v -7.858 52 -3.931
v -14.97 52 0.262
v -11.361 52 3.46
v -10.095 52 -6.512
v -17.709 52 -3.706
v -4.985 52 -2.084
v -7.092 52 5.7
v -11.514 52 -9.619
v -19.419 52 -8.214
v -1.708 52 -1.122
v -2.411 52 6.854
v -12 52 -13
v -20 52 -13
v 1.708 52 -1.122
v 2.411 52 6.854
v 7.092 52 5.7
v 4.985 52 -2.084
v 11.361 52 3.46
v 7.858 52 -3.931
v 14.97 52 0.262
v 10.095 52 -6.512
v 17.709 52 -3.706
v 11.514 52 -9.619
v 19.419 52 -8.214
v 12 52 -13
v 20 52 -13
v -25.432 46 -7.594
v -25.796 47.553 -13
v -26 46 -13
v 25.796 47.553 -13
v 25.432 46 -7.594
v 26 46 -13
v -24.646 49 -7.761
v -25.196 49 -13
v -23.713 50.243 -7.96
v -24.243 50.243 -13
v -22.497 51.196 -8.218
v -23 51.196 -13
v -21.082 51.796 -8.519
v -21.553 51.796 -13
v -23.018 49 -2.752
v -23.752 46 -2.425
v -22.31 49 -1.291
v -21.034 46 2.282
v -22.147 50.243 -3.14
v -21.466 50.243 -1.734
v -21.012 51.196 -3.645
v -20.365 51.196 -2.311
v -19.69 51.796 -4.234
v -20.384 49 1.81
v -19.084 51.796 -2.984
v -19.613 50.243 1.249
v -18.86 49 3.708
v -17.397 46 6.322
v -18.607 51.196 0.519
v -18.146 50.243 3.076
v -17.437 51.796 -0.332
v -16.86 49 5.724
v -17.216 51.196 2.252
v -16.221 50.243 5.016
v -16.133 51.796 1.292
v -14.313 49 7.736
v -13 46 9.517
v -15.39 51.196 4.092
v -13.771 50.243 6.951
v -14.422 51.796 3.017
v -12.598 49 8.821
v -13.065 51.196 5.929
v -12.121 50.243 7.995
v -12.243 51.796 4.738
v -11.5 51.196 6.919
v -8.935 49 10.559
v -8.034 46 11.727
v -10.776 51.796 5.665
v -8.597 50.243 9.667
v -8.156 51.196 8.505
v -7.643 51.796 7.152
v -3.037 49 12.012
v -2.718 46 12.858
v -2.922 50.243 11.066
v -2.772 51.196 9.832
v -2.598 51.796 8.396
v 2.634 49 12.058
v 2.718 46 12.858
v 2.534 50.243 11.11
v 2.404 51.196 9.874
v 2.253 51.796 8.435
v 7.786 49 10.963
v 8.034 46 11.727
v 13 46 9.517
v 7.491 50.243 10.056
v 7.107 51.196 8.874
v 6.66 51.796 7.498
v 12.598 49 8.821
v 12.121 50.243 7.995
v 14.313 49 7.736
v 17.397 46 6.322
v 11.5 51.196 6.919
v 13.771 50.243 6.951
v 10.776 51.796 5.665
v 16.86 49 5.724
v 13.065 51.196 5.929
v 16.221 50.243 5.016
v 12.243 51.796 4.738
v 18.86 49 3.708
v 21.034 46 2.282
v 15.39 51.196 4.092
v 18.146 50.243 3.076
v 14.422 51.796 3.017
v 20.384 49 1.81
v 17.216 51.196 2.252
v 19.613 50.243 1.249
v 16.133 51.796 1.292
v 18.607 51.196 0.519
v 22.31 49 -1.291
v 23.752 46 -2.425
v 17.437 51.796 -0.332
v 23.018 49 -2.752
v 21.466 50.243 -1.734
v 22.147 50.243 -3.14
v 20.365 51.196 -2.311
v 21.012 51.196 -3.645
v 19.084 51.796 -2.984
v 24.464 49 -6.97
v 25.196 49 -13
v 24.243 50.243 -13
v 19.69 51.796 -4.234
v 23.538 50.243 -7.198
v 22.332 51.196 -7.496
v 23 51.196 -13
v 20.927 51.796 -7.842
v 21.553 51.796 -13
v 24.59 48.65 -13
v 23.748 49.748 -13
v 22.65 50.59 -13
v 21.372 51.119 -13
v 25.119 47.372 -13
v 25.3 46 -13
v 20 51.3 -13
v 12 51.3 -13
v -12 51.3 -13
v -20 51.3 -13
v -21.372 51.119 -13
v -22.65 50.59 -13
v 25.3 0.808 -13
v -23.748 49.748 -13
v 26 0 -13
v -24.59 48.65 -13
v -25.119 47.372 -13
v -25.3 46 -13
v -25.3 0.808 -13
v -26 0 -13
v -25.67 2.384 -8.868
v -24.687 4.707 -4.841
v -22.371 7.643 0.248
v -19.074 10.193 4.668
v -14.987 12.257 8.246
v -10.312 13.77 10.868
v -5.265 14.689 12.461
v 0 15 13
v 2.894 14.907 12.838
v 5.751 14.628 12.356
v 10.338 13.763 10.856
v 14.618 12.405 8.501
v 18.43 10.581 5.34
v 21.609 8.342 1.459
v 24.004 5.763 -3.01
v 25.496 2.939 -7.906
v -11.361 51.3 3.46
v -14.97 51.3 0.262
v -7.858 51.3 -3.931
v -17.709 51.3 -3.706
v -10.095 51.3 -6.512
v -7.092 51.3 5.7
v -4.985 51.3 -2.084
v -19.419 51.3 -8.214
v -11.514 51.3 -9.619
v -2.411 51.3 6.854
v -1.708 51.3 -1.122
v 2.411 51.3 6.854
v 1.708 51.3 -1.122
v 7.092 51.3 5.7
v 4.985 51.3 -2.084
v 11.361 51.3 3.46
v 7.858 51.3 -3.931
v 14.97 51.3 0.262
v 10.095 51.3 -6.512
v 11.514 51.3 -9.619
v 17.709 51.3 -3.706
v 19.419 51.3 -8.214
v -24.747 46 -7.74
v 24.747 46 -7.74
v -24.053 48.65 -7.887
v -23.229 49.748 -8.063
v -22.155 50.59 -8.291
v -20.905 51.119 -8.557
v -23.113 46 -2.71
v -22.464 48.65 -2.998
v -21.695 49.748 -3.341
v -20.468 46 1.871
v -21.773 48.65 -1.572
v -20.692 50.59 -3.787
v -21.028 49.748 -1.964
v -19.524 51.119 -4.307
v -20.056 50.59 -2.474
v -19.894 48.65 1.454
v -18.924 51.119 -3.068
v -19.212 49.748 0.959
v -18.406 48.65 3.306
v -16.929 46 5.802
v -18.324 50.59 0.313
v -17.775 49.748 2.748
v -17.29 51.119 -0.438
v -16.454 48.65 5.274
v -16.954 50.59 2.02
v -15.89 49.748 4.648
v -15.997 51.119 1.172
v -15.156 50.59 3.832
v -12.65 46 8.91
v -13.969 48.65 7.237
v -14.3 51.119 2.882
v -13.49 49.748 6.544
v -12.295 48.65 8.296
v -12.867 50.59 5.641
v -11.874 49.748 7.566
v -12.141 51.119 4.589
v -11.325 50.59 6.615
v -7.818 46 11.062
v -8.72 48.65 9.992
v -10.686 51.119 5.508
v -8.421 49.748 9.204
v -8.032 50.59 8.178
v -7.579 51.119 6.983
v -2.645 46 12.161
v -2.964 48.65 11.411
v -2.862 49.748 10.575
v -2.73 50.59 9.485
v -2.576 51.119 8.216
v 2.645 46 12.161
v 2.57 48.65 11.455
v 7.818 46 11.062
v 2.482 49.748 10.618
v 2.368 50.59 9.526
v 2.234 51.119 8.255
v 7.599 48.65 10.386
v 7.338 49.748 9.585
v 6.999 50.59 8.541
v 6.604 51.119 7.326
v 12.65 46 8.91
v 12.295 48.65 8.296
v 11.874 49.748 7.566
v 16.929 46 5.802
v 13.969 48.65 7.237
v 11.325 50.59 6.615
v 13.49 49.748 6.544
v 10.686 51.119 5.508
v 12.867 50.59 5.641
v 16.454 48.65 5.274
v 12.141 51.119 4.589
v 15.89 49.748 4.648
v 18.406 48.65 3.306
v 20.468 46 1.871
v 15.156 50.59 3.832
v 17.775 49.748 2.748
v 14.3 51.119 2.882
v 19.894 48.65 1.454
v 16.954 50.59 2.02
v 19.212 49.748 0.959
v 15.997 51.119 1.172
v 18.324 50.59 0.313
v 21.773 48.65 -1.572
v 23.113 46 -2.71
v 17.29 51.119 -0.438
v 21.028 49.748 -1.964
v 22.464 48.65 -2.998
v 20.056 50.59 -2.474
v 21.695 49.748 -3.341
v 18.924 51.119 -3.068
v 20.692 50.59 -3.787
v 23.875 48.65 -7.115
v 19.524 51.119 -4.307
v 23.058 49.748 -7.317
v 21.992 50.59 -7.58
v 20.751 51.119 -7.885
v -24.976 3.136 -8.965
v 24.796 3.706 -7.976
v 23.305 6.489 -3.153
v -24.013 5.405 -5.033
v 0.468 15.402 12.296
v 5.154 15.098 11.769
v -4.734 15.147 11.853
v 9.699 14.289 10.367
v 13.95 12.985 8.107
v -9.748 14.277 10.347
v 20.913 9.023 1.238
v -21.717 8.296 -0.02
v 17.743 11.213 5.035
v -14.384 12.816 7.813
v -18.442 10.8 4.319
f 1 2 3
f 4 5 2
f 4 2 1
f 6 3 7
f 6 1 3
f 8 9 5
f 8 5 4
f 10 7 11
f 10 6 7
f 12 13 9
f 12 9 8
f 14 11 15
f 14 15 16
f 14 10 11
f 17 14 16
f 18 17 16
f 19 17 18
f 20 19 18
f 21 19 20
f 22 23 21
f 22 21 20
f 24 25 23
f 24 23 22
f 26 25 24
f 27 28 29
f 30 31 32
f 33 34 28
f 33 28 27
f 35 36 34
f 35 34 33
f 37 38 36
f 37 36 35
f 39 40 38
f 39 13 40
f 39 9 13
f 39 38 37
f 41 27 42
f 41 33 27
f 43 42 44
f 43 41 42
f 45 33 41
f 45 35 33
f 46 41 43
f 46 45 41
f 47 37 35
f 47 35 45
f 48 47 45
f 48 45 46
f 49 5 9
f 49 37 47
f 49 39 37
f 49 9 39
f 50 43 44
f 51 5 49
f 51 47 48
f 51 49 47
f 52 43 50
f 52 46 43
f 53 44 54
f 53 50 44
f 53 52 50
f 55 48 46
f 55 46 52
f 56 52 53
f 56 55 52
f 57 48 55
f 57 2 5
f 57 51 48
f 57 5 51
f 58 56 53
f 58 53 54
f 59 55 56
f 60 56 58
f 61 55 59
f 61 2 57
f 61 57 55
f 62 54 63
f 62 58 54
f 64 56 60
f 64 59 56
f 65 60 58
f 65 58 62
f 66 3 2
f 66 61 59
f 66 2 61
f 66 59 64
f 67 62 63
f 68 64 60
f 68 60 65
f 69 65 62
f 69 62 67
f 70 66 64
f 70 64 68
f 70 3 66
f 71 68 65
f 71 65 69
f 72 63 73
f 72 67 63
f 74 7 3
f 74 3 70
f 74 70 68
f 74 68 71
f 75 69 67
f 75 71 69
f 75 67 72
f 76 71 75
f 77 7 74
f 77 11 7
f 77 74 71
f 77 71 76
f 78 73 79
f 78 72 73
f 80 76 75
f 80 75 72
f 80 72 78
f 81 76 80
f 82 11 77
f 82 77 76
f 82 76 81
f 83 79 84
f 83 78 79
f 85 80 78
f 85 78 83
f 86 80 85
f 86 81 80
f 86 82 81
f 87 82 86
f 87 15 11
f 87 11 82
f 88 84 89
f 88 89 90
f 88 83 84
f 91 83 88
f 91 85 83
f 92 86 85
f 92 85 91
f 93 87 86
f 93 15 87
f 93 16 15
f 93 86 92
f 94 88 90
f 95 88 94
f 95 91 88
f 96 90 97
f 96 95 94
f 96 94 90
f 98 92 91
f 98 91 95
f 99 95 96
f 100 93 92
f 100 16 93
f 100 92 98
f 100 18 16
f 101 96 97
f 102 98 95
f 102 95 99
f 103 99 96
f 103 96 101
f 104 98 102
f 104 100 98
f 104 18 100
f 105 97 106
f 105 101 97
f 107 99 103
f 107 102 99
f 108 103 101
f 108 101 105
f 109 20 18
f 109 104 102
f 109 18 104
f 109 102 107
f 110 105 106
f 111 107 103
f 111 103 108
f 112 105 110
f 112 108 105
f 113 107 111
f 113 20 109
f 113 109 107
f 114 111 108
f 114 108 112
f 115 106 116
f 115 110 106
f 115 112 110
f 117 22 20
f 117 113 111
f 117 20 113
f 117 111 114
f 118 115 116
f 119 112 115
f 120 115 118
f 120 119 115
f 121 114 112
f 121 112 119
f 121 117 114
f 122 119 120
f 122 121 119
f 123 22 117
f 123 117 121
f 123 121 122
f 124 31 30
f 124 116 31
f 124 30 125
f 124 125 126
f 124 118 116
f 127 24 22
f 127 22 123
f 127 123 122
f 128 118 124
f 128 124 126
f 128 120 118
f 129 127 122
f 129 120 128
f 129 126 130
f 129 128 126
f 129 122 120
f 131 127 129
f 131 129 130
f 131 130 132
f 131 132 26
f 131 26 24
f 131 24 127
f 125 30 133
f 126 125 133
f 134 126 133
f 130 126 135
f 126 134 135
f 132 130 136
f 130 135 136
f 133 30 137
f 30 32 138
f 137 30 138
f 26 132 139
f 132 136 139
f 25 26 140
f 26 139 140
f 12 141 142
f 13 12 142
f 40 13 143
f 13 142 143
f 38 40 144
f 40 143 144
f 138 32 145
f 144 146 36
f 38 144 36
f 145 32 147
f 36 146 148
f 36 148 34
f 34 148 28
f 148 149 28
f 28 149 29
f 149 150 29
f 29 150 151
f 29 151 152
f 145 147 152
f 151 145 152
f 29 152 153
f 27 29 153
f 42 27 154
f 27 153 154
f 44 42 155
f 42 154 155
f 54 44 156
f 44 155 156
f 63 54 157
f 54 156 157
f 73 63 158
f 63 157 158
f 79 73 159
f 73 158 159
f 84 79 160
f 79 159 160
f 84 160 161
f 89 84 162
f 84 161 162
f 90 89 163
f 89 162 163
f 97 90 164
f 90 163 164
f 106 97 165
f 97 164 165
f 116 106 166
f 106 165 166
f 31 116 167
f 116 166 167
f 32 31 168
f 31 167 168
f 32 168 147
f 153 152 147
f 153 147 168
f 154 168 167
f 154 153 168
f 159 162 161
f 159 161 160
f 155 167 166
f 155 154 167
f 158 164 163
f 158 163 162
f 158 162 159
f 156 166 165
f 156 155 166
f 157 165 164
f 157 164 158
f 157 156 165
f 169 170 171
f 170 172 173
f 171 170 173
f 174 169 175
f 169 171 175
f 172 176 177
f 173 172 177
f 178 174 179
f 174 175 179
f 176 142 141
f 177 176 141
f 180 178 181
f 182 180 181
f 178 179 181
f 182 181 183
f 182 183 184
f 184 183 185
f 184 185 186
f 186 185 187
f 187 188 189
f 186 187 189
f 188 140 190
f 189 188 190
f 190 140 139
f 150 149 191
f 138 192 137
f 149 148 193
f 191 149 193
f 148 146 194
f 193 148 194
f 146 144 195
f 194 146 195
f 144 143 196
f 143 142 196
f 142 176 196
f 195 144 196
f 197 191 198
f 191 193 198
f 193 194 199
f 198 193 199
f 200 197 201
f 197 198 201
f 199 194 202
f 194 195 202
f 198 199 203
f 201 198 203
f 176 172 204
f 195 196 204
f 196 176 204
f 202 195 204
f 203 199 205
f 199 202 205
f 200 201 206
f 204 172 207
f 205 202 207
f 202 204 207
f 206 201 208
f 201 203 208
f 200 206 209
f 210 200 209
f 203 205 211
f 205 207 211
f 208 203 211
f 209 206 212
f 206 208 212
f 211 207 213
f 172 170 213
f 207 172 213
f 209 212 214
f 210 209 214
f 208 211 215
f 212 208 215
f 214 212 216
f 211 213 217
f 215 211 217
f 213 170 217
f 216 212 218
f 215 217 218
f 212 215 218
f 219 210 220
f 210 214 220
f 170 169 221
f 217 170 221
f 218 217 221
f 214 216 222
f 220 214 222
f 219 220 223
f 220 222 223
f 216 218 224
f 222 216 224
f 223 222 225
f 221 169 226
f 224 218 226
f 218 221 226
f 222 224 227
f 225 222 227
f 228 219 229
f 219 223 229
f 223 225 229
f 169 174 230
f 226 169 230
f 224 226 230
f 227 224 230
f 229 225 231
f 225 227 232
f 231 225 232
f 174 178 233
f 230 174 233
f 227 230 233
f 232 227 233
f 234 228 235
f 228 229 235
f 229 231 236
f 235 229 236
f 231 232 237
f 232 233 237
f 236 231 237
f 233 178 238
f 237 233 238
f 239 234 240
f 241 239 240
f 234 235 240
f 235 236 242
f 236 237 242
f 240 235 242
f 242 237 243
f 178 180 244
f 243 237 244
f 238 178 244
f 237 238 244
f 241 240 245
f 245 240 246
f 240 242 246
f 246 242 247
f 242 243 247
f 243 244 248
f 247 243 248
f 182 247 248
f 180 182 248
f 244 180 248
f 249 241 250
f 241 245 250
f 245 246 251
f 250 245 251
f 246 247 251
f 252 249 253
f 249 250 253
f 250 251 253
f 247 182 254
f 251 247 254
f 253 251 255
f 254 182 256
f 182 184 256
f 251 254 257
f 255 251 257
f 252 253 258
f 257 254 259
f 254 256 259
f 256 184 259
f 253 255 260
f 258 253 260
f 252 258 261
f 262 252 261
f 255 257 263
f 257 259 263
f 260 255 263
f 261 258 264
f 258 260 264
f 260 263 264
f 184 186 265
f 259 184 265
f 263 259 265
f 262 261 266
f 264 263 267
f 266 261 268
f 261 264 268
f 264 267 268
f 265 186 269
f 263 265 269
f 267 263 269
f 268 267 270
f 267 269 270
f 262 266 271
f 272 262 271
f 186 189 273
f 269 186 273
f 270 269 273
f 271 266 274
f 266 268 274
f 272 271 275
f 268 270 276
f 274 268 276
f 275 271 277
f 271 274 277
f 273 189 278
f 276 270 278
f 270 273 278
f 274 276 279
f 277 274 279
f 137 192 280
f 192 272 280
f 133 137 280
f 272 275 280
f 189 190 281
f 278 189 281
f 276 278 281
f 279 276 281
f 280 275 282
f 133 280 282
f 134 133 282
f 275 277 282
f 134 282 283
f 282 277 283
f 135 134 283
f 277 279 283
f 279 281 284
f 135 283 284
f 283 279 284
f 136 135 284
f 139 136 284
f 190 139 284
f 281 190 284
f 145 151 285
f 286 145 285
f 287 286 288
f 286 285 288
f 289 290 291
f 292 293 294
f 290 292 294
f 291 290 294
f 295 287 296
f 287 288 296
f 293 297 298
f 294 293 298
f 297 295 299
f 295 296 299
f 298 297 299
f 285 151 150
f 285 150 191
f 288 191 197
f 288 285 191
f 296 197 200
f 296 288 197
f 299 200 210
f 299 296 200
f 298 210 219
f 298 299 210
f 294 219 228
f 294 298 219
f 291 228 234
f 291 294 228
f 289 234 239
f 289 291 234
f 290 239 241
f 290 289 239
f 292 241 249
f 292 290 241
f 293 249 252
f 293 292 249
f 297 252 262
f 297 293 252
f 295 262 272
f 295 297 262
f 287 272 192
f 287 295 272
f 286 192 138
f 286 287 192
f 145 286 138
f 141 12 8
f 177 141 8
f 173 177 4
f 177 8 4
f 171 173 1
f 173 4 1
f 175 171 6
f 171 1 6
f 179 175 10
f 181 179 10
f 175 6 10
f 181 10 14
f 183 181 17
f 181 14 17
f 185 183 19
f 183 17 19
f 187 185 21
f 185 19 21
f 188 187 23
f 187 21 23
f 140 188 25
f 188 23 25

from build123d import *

# Parameters (mm, degrees)
BOSS_EXTRUDE1_DEPTH     = 52
FILLET1_R               = 6
CUT_EXTRUDE1_DEPTH      = 60.573484078
CUT_EXTRUDE1_DEPTH_BACK = 60.573484078
SHELL1_T                = -0.7
SKETCH3_R               = 12
CUT_EXTRUDE2_DEPTH      = 32


with BuildPart() as part:
    # Sketch1 → Boss-Extrude1 (new body)
    with BuildSketch(Plane(origin=(0, 0, 0), x_dir=(1, 0, 0), z_dir=(0, 1, 0))):
        with BuildLine():
            Line((26, 13), (-26, 13))
            ThreePointArc((-26, 13), (0, -13), (26, 13))
        make_face()
    extrude(amount=BOSS_EXTRUDE1_DEPTH)

    # Fillet1
    fillet1_edges = [part.edges().sort_by_distance(p)[0] for p in [
        (0, 52, 13),
    ]]
    fillet(fillet1_edges, radius=FILLET1_R)

    # Sketch2 → Cut-Extrude1 (cut, two sides: drawn at the far end of the back side and taken through both)
    with BuildSketch(Plane(origin=(0, 0, 0), x_dir=(0, 0, -1), z_dir=(1, 0, 0)).offset(-CUT_EXTRUDE1_DEPTH_BACK)):
        Polygon((13, 0), (-13, 15), (-13, 0), align=None)
    extrude(amount=CUT_EXTRUDE1_DEPTH + CUT_EXTRUDE1_DEPTH_BACK, mode=Mode.SUBTRACT)

    # Shell1
    shell1_openings = [part.faces().sort_by_distance(p)[0] for p in [
        (0, 25.858277944, -13),
    ]]
    offset(amount=SHELL1_T, openings=shell1_openings)

    # Sketch3 → Cut-Extrude2 (cut)
    with BuildSketch(Plane(origin=(0, 52, 0), x_dir=(1, 0, 0), z_dir=(0, 1, 0))):
        with Locations((0, 13)):
            Circle(SKETCH3_R)
    extrude(amount=-CUT_EXTRUDE2_DEPTH, mode=Mode.SUBTRACT)


solid = part.part
